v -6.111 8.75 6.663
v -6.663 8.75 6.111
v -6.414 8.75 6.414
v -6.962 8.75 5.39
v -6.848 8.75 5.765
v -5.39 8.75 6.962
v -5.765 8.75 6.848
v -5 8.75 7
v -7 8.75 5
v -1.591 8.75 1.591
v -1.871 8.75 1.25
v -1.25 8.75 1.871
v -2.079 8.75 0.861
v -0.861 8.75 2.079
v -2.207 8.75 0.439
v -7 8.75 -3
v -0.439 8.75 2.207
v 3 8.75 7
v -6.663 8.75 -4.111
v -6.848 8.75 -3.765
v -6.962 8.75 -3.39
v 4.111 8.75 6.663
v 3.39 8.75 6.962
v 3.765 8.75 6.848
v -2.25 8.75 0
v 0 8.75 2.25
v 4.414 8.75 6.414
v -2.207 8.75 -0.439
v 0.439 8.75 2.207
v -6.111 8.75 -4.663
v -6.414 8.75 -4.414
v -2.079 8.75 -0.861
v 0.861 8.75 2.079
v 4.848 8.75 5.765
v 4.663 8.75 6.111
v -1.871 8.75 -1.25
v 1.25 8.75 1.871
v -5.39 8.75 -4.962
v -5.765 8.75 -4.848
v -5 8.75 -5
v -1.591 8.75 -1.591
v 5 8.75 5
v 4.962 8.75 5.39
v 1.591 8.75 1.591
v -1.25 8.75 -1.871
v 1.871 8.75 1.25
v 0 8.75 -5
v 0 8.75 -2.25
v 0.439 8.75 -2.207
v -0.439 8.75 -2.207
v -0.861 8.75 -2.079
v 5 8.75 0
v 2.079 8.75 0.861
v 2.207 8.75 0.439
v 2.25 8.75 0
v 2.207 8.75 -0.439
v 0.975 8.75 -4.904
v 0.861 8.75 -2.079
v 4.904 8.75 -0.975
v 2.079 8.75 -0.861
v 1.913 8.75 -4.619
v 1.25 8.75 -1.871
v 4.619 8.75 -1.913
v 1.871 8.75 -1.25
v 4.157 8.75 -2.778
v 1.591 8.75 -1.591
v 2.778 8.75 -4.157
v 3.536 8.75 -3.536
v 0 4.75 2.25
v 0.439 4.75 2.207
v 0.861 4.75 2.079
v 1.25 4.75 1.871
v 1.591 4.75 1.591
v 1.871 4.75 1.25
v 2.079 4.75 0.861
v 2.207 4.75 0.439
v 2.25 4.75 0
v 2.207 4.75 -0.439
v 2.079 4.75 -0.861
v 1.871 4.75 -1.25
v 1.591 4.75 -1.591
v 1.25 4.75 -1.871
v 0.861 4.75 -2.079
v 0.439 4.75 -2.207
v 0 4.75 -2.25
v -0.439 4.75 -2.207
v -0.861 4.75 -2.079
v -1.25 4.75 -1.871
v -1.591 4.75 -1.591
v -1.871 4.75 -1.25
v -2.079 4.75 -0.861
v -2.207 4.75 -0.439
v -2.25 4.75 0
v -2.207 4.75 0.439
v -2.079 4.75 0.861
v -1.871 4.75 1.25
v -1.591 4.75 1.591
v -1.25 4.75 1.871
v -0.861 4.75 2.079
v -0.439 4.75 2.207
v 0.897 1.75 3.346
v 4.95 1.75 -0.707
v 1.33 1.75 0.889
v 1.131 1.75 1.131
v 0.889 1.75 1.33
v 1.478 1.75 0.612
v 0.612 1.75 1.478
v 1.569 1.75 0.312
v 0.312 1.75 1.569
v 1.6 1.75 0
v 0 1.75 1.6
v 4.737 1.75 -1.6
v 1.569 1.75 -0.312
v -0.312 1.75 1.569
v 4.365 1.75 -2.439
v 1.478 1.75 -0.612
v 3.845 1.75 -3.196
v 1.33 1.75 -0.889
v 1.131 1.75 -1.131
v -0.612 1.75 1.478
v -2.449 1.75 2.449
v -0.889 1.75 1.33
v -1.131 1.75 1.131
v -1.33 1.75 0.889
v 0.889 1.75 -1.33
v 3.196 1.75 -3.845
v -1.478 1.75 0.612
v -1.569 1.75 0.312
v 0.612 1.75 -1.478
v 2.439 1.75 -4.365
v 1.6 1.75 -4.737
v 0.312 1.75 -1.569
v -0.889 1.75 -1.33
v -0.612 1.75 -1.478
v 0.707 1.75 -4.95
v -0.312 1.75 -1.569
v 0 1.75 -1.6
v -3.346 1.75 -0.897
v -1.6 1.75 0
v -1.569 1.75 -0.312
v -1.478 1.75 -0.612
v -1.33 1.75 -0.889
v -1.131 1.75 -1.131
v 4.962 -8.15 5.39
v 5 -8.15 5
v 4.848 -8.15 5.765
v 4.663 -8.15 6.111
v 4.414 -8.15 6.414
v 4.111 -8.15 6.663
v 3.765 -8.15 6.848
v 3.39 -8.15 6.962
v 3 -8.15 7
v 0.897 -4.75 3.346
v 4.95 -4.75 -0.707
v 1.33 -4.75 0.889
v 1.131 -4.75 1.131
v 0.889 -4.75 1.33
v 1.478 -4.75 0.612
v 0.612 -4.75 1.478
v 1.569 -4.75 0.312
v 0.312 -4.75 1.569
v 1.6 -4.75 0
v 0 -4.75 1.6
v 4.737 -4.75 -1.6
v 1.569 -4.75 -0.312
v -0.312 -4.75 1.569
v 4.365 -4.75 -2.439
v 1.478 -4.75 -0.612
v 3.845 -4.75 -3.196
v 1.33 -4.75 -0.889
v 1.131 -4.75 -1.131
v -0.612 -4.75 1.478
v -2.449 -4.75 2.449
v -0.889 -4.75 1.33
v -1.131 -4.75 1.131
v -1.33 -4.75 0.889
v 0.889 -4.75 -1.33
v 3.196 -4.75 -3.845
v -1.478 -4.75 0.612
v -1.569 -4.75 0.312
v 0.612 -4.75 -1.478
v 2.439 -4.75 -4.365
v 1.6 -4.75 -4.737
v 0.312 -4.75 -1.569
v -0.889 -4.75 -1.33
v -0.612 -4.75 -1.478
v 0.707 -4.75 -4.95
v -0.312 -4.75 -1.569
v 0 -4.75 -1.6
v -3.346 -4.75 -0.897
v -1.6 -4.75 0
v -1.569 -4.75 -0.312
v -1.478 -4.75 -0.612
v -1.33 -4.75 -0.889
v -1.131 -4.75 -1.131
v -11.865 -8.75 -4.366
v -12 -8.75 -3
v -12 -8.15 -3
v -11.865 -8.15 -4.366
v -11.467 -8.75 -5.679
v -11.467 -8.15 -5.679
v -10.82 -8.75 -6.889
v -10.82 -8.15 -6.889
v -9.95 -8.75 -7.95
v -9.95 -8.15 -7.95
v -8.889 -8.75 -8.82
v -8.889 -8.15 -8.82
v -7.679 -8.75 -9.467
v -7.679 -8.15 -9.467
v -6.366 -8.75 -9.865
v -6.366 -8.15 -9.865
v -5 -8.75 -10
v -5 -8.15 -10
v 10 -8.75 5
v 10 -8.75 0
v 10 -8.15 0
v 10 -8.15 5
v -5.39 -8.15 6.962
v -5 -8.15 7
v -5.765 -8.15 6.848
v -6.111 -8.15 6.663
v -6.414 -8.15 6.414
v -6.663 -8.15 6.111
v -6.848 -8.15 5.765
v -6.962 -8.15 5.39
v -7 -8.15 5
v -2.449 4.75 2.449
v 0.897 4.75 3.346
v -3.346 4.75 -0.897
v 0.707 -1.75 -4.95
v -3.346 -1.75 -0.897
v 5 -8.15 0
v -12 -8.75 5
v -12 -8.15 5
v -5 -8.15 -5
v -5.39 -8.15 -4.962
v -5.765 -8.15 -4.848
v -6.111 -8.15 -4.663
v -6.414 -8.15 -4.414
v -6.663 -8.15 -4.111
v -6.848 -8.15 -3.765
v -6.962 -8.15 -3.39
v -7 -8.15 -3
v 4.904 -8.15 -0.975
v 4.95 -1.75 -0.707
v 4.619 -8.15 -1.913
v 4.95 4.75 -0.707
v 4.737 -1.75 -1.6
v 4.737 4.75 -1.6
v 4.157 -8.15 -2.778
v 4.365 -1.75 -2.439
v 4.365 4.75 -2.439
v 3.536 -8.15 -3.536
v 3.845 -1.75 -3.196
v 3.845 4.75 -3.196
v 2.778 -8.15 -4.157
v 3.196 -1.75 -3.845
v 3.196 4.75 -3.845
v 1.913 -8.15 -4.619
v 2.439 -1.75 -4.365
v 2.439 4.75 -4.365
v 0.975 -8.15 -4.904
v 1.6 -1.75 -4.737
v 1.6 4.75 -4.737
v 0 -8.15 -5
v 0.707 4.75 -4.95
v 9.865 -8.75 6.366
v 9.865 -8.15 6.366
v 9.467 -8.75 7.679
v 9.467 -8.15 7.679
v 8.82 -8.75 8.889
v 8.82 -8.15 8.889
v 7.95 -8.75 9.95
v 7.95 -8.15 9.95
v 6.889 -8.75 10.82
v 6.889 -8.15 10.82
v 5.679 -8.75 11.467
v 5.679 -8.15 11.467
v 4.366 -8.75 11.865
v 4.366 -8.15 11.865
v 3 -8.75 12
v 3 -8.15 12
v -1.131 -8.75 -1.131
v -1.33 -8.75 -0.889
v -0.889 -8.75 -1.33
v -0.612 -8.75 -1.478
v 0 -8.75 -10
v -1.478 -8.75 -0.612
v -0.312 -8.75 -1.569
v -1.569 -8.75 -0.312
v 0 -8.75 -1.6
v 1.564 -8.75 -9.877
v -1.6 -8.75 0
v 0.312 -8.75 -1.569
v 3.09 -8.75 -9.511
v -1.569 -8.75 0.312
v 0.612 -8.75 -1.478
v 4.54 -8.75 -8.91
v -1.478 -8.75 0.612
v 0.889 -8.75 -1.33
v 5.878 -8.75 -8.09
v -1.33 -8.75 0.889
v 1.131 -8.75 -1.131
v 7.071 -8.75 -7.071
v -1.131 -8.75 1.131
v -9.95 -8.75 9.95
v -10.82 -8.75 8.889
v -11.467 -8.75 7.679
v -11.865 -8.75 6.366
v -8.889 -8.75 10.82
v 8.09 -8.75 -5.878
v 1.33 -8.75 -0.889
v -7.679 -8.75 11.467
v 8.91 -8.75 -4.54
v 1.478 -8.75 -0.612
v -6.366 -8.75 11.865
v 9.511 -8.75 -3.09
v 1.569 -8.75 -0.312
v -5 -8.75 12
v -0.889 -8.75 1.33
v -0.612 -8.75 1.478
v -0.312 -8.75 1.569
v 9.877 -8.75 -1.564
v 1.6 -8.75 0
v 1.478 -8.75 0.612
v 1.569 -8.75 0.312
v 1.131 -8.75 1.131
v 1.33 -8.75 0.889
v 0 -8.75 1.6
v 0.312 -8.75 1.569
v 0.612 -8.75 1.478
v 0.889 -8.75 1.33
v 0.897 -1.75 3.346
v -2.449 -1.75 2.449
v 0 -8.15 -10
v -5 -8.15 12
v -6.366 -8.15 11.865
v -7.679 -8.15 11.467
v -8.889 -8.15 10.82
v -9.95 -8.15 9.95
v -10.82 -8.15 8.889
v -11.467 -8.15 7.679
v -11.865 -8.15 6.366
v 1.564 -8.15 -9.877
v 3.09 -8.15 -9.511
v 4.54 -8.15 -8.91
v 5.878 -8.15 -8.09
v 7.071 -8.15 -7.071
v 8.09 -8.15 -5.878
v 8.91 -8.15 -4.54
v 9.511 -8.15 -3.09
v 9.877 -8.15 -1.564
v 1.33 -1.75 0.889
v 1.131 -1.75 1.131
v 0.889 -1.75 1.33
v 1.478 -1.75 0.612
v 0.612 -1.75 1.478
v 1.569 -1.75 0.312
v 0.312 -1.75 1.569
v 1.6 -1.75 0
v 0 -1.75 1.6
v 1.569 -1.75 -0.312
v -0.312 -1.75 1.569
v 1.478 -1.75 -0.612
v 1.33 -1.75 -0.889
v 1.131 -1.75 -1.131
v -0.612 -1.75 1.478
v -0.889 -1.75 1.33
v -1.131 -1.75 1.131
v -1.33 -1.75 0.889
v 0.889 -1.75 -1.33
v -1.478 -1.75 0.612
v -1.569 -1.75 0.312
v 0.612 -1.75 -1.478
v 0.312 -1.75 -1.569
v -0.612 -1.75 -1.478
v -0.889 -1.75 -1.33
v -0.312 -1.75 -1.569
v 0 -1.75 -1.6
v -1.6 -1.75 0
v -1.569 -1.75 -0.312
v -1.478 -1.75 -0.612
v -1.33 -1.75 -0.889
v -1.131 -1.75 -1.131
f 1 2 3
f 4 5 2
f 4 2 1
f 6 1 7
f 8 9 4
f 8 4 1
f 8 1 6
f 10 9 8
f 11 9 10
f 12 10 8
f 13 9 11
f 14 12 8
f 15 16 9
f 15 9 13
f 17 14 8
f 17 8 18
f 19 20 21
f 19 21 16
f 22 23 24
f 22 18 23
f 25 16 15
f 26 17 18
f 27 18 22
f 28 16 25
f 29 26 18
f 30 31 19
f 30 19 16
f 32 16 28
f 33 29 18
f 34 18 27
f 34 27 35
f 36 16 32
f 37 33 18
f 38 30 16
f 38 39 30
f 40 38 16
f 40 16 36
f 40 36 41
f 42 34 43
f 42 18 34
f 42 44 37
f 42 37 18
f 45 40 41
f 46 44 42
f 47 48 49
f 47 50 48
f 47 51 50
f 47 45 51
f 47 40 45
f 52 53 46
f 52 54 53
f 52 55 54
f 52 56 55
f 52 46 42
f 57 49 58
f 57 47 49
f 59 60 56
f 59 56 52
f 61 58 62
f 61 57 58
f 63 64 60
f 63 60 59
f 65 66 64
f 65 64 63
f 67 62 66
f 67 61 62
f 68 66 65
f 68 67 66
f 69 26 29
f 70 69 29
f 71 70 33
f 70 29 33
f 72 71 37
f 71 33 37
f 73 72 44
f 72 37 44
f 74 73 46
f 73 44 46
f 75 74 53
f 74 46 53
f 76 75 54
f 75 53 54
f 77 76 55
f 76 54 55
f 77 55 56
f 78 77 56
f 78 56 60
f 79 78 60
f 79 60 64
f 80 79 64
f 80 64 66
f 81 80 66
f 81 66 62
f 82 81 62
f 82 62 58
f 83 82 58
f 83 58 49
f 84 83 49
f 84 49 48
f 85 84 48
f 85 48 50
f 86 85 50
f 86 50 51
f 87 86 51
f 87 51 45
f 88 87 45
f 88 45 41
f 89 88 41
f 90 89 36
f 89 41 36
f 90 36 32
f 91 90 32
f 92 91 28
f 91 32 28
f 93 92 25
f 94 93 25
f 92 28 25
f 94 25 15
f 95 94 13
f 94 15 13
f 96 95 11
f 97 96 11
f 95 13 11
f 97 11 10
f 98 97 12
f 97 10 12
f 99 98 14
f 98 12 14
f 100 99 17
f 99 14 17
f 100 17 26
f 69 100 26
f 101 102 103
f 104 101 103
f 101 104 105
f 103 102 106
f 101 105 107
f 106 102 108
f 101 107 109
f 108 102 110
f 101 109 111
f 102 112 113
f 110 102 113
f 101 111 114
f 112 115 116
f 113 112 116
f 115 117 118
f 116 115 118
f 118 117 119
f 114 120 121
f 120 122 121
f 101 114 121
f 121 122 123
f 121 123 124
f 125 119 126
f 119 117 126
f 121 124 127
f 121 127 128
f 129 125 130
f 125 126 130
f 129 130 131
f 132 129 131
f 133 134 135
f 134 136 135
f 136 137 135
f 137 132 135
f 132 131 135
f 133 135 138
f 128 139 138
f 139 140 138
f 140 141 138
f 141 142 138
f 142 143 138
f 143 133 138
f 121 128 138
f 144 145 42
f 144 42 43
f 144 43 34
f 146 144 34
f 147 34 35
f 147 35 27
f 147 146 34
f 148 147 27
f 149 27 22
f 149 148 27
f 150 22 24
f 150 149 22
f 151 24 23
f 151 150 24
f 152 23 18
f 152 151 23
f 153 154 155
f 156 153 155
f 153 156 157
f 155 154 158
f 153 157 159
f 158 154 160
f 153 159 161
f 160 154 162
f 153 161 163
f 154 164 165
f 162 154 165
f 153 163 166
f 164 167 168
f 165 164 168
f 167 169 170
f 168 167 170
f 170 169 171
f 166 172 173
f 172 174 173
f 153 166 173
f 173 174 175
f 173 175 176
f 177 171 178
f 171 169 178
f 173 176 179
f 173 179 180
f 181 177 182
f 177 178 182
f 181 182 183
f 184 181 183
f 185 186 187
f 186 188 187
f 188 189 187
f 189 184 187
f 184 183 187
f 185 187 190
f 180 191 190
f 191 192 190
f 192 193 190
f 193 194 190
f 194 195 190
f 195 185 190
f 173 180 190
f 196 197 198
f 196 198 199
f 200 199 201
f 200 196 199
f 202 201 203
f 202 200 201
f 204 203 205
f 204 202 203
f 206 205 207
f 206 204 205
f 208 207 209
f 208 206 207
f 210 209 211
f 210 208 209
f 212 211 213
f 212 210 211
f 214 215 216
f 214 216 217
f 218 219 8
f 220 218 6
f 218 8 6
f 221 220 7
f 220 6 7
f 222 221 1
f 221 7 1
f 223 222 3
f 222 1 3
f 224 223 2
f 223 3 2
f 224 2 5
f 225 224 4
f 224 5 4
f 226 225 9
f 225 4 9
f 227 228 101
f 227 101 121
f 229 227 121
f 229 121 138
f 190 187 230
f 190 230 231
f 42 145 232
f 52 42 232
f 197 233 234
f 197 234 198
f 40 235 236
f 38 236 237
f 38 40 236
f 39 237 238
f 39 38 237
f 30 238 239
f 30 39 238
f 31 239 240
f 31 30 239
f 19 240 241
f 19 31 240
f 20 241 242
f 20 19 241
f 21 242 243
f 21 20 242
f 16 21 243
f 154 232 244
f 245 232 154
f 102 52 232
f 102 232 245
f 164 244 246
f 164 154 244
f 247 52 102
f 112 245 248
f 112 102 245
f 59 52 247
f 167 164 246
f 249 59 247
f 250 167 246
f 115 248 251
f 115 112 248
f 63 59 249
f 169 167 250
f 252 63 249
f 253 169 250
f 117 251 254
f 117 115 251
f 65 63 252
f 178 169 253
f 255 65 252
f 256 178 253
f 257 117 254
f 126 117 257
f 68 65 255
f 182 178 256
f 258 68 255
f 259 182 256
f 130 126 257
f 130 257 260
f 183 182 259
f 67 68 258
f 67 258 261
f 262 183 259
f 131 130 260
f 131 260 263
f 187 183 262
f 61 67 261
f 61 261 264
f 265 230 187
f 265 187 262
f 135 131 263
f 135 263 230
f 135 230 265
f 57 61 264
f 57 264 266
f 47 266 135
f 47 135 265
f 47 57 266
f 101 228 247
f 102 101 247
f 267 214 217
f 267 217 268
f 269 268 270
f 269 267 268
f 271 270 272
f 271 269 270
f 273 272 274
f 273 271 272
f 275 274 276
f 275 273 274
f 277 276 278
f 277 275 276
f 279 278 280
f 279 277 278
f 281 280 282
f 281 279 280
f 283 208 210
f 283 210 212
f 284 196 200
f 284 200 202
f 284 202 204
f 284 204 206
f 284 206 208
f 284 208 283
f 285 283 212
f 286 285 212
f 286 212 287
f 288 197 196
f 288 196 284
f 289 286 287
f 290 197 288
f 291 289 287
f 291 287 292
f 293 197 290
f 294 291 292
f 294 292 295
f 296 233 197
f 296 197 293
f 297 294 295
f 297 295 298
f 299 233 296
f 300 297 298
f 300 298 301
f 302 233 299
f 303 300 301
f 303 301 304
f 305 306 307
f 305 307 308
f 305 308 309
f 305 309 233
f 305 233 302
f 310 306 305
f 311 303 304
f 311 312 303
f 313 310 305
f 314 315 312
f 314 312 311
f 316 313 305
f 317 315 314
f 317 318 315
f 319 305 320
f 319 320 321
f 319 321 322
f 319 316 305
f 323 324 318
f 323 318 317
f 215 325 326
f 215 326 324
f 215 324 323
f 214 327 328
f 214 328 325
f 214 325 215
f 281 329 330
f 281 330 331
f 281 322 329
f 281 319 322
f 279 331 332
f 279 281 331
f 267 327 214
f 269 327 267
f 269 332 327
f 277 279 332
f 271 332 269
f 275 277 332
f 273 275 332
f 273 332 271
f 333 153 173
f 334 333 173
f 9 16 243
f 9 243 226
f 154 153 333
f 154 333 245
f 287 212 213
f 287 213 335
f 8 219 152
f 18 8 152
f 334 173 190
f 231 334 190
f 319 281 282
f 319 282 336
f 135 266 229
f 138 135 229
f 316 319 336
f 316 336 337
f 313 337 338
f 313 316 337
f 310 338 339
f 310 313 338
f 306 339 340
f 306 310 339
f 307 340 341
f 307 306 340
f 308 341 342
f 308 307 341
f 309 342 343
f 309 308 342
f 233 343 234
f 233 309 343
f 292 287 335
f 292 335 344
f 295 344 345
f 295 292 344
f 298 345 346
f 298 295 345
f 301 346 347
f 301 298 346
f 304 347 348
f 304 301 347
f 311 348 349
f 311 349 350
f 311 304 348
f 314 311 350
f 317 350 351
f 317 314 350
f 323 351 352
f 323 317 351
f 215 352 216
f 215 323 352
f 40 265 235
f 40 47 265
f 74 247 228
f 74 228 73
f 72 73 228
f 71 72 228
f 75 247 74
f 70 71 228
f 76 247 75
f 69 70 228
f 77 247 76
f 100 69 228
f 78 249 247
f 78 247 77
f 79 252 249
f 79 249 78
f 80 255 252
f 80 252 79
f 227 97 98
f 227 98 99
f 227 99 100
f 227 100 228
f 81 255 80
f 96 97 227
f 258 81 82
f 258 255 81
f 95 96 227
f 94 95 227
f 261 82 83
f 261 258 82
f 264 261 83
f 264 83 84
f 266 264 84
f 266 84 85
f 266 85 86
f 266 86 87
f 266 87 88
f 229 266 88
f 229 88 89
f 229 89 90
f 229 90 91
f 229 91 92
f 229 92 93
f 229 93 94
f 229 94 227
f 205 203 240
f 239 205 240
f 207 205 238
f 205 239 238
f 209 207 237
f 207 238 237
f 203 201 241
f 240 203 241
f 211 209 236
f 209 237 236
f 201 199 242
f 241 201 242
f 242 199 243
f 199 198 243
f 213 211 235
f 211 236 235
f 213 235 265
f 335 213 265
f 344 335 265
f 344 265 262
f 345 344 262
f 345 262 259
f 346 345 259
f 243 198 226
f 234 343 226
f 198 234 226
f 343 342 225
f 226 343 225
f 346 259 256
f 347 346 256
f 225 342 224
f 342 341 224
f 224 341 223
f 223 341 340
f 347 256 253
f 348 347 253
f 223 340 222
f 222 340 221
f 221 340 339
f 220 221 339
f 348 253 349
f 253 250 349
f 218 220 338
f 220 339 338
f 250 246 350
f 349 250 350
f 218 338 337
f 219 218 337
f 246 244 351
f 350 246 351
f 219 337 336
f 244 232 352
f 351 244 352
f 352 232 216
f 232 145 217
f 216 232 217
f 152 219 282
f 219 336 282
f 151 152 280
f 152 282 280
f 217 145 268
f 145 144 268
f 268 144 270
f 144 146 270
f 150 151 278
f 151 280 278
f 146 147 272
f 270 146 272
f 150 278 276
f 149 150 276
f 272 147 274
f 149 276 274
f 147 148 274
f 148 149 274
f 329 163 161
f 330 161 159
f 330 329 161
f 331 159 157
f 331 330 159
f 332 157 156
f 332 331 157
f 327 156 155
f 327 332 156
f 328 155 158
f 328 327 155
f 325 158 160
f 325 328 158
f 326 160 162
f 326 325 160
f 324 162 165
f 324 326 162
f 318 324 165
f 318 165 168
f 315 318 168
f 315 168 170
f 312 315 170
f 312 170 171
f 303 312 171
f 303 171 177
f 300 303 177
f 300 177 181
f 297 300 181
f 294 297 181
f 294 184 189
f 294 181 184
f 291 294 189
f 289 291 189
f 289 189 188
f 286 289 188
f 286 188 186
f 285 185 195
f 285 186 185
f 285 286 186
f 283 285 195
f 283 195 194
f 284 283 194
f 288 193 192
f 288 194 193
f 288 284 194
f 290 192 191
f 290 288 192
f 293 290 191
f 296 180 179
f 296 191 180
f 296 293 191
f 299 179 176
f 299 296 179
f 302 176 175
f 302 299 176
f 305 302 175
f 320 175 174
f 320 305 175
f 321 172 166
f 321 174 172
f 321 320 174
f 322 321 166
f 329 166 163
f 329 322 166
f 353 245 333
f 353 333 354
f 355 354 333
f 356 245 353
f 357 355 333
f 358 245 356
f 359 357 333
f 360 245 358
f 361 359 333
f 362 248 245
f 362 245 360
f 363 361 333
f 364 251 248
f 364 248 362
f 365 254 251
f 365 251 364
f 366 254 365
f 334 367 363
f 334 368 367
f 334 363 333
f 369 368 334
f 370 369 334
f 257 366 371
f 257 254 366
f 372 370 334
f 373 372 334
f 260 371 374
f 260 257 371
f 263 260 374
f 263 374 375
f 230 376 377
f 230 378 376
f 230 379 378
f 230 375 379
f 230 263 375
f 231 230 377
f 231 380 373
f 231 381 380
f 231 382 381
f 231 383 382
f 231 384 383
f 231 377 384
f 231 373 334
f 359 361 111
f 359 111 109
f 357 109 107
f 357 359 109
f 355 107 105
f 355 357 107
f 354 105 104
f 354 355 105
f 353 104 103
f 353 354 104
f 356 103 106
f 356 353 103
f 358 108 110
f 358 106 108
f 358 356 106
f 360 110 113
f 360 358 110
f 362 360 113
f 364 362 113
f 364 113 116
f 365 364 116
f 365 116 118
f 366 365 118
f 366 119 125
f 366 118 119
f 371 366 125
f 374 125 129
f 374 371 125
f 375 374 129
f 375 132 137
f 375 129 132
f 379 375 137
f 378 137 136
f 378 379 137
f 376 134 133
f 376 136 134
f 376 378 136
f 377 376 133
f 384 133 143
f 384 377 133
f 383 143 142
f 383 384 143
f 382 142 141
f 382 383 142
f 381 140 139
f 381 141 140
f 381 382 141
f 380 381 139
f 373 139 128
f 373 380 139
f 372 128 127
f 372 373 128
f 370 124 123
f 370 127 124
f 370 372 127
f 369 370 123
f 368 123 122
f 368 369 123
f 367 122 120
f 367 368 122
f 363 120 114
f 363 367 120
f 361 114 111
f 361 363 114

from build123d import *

# Parameters (mm, degrees)
SKETCH1_R           = 1.6
BOSS_EXTRUDE1_DEPTH = 8.75
FILLET1_R           = 2
CUT_EXTRUDE1_START  = 4.75
CUT_EXTRUDE1_DEPTH  = 3
CUT_EXTRUDE2_START  = -4.75
CUT_EXTRUDE2_DEPTH  = 3
SKETCH3_R           = 2.25
CUT_EXTRUDE3_DEPTH  = 7
SKETCH4_R           = 1.6
BOSS_EXTRUDE3_DEPTH = 0.6


with BuildPart() as part:
    # Sketch1 → Boss-Extrude1 (new, symmetric)
    with BuildSketch(Plane(origin=(0, 0, 0), x_dir=(1, 0, 0), z_dir=(0, 1, 0))):
        with BuildLine():
            Line((0, 5), (-7, 5))
            Line((-7, 5), (-7, -7))
            Line((-7, -7), (5, -7))
            Line((5, -7), (5, 0))
            ThreePointArc((5, 0), (3.535533906, 3.535533906), (0, 5))
        make_face()
        with Locations(Location((0, 0, 0), (0, 0, 270))):
            Circle(SKETCH1_R, mode=Mode.SUBTRACT)
    extrude(amount=BOSS_EXTRUDE1_DEPTH, both=True)

    # Fillet1
    fillet1_edges = [part.edges().sort_by_distance(p)[0] for p in [
        (5, 0, 7),
        (-7, 0, 7),
        (-7, 0, -5),
    ]]
    fillet(fillet1_edges, radius=FILLET1_R)

    # Sketch2 → Cut-Extrude1 (cut)
    with BuildSketch(Plane(origin=(0, 0, 0), x_dir=(1, 0, 0), z_dir=(0, 1, 0)).offset(CUT_EXTRUDE1_START)):
        Polygon((-0.896575472, 3.346065215), (0.757359313, 5), (5, 5), (5, 0.757359313), (3.346065215, -0.896575472), (0.896575472, -3.346065215), (-2.449489743, -2.449489743), (-3.346065215, 0.896575472), align=None)
    extrude(amount=-CUT_EXTRUDE1_DEPTH, mode=Mode.SUBTRACT)

    # Sketch2<2> → Cut-Extrude2 (cut)
    with BuildSketch(Plane(origin=(0, 0, 0), x_dir=(1, 0, 0), z_dir=(0, 1, 0)).offset(CUT_EXTRUDE2_START)):
        Polygon((-0.896575472, 3.346065215), (0.757359313, 5), (5, 5), (5, 0.757359313), (3.346065215, -0.896575472), (0.896575472, -3.346065215), (-2.449489743, -2.449489743), (-3.346065215, 0.896575472), align=None)
    extrude(amount=CUT_EXTRUDE2_DEPTH, mode=Mode.SUBTRACT)

    # Sketch3 → Cut-Extrude3 (cut)
    with BuildSketch(Plane(origin=(0, 8.75, 0), x_dir=(1, 0, 0), z_dir=(0, 1, 0))):
        with Locations(Location((0, 0, 0), (0, 0, 270))):
            Circle(SKETCH3_R)
    extrude(amount=-CUT_EXTRUDE3_DEPTH, mode=Mode.SUBTRACT)

    # Sketch4 → Boss-Extrude3 (add)
    with BuildSketch(Plane.XZ.offset(8.75)):
        with BuildLine():
            Line((10, 0), (10, 5))
            ThreePointArc((10, 5), (7.949747468, 9.949747468), (3, 12))
            Line((3, 12), (-5, 12))
            ThreePointArc((-5, 12), (-9.949747468, 9.949747468), (-12, 5))
            Line((-12, 5), (-12, -3))
            ThreePointArc((-12, -3), (-9.949747468, -7.949747468), (-5, -10))
            Line((-5, -10), (0, -10))
            ThreePointArc((0, -10), (7.071067812, -7.071067812), (10, 0))
        make_face()
        with Locations(Location((0, 0, 0), (0, 0, 270))):
            Circle(SKETCH4_R, mode=Mode.SUBTRACT)
    extrude(amount=-BOSS_EXTRUDE3_DEPTH)


solid = part.part
